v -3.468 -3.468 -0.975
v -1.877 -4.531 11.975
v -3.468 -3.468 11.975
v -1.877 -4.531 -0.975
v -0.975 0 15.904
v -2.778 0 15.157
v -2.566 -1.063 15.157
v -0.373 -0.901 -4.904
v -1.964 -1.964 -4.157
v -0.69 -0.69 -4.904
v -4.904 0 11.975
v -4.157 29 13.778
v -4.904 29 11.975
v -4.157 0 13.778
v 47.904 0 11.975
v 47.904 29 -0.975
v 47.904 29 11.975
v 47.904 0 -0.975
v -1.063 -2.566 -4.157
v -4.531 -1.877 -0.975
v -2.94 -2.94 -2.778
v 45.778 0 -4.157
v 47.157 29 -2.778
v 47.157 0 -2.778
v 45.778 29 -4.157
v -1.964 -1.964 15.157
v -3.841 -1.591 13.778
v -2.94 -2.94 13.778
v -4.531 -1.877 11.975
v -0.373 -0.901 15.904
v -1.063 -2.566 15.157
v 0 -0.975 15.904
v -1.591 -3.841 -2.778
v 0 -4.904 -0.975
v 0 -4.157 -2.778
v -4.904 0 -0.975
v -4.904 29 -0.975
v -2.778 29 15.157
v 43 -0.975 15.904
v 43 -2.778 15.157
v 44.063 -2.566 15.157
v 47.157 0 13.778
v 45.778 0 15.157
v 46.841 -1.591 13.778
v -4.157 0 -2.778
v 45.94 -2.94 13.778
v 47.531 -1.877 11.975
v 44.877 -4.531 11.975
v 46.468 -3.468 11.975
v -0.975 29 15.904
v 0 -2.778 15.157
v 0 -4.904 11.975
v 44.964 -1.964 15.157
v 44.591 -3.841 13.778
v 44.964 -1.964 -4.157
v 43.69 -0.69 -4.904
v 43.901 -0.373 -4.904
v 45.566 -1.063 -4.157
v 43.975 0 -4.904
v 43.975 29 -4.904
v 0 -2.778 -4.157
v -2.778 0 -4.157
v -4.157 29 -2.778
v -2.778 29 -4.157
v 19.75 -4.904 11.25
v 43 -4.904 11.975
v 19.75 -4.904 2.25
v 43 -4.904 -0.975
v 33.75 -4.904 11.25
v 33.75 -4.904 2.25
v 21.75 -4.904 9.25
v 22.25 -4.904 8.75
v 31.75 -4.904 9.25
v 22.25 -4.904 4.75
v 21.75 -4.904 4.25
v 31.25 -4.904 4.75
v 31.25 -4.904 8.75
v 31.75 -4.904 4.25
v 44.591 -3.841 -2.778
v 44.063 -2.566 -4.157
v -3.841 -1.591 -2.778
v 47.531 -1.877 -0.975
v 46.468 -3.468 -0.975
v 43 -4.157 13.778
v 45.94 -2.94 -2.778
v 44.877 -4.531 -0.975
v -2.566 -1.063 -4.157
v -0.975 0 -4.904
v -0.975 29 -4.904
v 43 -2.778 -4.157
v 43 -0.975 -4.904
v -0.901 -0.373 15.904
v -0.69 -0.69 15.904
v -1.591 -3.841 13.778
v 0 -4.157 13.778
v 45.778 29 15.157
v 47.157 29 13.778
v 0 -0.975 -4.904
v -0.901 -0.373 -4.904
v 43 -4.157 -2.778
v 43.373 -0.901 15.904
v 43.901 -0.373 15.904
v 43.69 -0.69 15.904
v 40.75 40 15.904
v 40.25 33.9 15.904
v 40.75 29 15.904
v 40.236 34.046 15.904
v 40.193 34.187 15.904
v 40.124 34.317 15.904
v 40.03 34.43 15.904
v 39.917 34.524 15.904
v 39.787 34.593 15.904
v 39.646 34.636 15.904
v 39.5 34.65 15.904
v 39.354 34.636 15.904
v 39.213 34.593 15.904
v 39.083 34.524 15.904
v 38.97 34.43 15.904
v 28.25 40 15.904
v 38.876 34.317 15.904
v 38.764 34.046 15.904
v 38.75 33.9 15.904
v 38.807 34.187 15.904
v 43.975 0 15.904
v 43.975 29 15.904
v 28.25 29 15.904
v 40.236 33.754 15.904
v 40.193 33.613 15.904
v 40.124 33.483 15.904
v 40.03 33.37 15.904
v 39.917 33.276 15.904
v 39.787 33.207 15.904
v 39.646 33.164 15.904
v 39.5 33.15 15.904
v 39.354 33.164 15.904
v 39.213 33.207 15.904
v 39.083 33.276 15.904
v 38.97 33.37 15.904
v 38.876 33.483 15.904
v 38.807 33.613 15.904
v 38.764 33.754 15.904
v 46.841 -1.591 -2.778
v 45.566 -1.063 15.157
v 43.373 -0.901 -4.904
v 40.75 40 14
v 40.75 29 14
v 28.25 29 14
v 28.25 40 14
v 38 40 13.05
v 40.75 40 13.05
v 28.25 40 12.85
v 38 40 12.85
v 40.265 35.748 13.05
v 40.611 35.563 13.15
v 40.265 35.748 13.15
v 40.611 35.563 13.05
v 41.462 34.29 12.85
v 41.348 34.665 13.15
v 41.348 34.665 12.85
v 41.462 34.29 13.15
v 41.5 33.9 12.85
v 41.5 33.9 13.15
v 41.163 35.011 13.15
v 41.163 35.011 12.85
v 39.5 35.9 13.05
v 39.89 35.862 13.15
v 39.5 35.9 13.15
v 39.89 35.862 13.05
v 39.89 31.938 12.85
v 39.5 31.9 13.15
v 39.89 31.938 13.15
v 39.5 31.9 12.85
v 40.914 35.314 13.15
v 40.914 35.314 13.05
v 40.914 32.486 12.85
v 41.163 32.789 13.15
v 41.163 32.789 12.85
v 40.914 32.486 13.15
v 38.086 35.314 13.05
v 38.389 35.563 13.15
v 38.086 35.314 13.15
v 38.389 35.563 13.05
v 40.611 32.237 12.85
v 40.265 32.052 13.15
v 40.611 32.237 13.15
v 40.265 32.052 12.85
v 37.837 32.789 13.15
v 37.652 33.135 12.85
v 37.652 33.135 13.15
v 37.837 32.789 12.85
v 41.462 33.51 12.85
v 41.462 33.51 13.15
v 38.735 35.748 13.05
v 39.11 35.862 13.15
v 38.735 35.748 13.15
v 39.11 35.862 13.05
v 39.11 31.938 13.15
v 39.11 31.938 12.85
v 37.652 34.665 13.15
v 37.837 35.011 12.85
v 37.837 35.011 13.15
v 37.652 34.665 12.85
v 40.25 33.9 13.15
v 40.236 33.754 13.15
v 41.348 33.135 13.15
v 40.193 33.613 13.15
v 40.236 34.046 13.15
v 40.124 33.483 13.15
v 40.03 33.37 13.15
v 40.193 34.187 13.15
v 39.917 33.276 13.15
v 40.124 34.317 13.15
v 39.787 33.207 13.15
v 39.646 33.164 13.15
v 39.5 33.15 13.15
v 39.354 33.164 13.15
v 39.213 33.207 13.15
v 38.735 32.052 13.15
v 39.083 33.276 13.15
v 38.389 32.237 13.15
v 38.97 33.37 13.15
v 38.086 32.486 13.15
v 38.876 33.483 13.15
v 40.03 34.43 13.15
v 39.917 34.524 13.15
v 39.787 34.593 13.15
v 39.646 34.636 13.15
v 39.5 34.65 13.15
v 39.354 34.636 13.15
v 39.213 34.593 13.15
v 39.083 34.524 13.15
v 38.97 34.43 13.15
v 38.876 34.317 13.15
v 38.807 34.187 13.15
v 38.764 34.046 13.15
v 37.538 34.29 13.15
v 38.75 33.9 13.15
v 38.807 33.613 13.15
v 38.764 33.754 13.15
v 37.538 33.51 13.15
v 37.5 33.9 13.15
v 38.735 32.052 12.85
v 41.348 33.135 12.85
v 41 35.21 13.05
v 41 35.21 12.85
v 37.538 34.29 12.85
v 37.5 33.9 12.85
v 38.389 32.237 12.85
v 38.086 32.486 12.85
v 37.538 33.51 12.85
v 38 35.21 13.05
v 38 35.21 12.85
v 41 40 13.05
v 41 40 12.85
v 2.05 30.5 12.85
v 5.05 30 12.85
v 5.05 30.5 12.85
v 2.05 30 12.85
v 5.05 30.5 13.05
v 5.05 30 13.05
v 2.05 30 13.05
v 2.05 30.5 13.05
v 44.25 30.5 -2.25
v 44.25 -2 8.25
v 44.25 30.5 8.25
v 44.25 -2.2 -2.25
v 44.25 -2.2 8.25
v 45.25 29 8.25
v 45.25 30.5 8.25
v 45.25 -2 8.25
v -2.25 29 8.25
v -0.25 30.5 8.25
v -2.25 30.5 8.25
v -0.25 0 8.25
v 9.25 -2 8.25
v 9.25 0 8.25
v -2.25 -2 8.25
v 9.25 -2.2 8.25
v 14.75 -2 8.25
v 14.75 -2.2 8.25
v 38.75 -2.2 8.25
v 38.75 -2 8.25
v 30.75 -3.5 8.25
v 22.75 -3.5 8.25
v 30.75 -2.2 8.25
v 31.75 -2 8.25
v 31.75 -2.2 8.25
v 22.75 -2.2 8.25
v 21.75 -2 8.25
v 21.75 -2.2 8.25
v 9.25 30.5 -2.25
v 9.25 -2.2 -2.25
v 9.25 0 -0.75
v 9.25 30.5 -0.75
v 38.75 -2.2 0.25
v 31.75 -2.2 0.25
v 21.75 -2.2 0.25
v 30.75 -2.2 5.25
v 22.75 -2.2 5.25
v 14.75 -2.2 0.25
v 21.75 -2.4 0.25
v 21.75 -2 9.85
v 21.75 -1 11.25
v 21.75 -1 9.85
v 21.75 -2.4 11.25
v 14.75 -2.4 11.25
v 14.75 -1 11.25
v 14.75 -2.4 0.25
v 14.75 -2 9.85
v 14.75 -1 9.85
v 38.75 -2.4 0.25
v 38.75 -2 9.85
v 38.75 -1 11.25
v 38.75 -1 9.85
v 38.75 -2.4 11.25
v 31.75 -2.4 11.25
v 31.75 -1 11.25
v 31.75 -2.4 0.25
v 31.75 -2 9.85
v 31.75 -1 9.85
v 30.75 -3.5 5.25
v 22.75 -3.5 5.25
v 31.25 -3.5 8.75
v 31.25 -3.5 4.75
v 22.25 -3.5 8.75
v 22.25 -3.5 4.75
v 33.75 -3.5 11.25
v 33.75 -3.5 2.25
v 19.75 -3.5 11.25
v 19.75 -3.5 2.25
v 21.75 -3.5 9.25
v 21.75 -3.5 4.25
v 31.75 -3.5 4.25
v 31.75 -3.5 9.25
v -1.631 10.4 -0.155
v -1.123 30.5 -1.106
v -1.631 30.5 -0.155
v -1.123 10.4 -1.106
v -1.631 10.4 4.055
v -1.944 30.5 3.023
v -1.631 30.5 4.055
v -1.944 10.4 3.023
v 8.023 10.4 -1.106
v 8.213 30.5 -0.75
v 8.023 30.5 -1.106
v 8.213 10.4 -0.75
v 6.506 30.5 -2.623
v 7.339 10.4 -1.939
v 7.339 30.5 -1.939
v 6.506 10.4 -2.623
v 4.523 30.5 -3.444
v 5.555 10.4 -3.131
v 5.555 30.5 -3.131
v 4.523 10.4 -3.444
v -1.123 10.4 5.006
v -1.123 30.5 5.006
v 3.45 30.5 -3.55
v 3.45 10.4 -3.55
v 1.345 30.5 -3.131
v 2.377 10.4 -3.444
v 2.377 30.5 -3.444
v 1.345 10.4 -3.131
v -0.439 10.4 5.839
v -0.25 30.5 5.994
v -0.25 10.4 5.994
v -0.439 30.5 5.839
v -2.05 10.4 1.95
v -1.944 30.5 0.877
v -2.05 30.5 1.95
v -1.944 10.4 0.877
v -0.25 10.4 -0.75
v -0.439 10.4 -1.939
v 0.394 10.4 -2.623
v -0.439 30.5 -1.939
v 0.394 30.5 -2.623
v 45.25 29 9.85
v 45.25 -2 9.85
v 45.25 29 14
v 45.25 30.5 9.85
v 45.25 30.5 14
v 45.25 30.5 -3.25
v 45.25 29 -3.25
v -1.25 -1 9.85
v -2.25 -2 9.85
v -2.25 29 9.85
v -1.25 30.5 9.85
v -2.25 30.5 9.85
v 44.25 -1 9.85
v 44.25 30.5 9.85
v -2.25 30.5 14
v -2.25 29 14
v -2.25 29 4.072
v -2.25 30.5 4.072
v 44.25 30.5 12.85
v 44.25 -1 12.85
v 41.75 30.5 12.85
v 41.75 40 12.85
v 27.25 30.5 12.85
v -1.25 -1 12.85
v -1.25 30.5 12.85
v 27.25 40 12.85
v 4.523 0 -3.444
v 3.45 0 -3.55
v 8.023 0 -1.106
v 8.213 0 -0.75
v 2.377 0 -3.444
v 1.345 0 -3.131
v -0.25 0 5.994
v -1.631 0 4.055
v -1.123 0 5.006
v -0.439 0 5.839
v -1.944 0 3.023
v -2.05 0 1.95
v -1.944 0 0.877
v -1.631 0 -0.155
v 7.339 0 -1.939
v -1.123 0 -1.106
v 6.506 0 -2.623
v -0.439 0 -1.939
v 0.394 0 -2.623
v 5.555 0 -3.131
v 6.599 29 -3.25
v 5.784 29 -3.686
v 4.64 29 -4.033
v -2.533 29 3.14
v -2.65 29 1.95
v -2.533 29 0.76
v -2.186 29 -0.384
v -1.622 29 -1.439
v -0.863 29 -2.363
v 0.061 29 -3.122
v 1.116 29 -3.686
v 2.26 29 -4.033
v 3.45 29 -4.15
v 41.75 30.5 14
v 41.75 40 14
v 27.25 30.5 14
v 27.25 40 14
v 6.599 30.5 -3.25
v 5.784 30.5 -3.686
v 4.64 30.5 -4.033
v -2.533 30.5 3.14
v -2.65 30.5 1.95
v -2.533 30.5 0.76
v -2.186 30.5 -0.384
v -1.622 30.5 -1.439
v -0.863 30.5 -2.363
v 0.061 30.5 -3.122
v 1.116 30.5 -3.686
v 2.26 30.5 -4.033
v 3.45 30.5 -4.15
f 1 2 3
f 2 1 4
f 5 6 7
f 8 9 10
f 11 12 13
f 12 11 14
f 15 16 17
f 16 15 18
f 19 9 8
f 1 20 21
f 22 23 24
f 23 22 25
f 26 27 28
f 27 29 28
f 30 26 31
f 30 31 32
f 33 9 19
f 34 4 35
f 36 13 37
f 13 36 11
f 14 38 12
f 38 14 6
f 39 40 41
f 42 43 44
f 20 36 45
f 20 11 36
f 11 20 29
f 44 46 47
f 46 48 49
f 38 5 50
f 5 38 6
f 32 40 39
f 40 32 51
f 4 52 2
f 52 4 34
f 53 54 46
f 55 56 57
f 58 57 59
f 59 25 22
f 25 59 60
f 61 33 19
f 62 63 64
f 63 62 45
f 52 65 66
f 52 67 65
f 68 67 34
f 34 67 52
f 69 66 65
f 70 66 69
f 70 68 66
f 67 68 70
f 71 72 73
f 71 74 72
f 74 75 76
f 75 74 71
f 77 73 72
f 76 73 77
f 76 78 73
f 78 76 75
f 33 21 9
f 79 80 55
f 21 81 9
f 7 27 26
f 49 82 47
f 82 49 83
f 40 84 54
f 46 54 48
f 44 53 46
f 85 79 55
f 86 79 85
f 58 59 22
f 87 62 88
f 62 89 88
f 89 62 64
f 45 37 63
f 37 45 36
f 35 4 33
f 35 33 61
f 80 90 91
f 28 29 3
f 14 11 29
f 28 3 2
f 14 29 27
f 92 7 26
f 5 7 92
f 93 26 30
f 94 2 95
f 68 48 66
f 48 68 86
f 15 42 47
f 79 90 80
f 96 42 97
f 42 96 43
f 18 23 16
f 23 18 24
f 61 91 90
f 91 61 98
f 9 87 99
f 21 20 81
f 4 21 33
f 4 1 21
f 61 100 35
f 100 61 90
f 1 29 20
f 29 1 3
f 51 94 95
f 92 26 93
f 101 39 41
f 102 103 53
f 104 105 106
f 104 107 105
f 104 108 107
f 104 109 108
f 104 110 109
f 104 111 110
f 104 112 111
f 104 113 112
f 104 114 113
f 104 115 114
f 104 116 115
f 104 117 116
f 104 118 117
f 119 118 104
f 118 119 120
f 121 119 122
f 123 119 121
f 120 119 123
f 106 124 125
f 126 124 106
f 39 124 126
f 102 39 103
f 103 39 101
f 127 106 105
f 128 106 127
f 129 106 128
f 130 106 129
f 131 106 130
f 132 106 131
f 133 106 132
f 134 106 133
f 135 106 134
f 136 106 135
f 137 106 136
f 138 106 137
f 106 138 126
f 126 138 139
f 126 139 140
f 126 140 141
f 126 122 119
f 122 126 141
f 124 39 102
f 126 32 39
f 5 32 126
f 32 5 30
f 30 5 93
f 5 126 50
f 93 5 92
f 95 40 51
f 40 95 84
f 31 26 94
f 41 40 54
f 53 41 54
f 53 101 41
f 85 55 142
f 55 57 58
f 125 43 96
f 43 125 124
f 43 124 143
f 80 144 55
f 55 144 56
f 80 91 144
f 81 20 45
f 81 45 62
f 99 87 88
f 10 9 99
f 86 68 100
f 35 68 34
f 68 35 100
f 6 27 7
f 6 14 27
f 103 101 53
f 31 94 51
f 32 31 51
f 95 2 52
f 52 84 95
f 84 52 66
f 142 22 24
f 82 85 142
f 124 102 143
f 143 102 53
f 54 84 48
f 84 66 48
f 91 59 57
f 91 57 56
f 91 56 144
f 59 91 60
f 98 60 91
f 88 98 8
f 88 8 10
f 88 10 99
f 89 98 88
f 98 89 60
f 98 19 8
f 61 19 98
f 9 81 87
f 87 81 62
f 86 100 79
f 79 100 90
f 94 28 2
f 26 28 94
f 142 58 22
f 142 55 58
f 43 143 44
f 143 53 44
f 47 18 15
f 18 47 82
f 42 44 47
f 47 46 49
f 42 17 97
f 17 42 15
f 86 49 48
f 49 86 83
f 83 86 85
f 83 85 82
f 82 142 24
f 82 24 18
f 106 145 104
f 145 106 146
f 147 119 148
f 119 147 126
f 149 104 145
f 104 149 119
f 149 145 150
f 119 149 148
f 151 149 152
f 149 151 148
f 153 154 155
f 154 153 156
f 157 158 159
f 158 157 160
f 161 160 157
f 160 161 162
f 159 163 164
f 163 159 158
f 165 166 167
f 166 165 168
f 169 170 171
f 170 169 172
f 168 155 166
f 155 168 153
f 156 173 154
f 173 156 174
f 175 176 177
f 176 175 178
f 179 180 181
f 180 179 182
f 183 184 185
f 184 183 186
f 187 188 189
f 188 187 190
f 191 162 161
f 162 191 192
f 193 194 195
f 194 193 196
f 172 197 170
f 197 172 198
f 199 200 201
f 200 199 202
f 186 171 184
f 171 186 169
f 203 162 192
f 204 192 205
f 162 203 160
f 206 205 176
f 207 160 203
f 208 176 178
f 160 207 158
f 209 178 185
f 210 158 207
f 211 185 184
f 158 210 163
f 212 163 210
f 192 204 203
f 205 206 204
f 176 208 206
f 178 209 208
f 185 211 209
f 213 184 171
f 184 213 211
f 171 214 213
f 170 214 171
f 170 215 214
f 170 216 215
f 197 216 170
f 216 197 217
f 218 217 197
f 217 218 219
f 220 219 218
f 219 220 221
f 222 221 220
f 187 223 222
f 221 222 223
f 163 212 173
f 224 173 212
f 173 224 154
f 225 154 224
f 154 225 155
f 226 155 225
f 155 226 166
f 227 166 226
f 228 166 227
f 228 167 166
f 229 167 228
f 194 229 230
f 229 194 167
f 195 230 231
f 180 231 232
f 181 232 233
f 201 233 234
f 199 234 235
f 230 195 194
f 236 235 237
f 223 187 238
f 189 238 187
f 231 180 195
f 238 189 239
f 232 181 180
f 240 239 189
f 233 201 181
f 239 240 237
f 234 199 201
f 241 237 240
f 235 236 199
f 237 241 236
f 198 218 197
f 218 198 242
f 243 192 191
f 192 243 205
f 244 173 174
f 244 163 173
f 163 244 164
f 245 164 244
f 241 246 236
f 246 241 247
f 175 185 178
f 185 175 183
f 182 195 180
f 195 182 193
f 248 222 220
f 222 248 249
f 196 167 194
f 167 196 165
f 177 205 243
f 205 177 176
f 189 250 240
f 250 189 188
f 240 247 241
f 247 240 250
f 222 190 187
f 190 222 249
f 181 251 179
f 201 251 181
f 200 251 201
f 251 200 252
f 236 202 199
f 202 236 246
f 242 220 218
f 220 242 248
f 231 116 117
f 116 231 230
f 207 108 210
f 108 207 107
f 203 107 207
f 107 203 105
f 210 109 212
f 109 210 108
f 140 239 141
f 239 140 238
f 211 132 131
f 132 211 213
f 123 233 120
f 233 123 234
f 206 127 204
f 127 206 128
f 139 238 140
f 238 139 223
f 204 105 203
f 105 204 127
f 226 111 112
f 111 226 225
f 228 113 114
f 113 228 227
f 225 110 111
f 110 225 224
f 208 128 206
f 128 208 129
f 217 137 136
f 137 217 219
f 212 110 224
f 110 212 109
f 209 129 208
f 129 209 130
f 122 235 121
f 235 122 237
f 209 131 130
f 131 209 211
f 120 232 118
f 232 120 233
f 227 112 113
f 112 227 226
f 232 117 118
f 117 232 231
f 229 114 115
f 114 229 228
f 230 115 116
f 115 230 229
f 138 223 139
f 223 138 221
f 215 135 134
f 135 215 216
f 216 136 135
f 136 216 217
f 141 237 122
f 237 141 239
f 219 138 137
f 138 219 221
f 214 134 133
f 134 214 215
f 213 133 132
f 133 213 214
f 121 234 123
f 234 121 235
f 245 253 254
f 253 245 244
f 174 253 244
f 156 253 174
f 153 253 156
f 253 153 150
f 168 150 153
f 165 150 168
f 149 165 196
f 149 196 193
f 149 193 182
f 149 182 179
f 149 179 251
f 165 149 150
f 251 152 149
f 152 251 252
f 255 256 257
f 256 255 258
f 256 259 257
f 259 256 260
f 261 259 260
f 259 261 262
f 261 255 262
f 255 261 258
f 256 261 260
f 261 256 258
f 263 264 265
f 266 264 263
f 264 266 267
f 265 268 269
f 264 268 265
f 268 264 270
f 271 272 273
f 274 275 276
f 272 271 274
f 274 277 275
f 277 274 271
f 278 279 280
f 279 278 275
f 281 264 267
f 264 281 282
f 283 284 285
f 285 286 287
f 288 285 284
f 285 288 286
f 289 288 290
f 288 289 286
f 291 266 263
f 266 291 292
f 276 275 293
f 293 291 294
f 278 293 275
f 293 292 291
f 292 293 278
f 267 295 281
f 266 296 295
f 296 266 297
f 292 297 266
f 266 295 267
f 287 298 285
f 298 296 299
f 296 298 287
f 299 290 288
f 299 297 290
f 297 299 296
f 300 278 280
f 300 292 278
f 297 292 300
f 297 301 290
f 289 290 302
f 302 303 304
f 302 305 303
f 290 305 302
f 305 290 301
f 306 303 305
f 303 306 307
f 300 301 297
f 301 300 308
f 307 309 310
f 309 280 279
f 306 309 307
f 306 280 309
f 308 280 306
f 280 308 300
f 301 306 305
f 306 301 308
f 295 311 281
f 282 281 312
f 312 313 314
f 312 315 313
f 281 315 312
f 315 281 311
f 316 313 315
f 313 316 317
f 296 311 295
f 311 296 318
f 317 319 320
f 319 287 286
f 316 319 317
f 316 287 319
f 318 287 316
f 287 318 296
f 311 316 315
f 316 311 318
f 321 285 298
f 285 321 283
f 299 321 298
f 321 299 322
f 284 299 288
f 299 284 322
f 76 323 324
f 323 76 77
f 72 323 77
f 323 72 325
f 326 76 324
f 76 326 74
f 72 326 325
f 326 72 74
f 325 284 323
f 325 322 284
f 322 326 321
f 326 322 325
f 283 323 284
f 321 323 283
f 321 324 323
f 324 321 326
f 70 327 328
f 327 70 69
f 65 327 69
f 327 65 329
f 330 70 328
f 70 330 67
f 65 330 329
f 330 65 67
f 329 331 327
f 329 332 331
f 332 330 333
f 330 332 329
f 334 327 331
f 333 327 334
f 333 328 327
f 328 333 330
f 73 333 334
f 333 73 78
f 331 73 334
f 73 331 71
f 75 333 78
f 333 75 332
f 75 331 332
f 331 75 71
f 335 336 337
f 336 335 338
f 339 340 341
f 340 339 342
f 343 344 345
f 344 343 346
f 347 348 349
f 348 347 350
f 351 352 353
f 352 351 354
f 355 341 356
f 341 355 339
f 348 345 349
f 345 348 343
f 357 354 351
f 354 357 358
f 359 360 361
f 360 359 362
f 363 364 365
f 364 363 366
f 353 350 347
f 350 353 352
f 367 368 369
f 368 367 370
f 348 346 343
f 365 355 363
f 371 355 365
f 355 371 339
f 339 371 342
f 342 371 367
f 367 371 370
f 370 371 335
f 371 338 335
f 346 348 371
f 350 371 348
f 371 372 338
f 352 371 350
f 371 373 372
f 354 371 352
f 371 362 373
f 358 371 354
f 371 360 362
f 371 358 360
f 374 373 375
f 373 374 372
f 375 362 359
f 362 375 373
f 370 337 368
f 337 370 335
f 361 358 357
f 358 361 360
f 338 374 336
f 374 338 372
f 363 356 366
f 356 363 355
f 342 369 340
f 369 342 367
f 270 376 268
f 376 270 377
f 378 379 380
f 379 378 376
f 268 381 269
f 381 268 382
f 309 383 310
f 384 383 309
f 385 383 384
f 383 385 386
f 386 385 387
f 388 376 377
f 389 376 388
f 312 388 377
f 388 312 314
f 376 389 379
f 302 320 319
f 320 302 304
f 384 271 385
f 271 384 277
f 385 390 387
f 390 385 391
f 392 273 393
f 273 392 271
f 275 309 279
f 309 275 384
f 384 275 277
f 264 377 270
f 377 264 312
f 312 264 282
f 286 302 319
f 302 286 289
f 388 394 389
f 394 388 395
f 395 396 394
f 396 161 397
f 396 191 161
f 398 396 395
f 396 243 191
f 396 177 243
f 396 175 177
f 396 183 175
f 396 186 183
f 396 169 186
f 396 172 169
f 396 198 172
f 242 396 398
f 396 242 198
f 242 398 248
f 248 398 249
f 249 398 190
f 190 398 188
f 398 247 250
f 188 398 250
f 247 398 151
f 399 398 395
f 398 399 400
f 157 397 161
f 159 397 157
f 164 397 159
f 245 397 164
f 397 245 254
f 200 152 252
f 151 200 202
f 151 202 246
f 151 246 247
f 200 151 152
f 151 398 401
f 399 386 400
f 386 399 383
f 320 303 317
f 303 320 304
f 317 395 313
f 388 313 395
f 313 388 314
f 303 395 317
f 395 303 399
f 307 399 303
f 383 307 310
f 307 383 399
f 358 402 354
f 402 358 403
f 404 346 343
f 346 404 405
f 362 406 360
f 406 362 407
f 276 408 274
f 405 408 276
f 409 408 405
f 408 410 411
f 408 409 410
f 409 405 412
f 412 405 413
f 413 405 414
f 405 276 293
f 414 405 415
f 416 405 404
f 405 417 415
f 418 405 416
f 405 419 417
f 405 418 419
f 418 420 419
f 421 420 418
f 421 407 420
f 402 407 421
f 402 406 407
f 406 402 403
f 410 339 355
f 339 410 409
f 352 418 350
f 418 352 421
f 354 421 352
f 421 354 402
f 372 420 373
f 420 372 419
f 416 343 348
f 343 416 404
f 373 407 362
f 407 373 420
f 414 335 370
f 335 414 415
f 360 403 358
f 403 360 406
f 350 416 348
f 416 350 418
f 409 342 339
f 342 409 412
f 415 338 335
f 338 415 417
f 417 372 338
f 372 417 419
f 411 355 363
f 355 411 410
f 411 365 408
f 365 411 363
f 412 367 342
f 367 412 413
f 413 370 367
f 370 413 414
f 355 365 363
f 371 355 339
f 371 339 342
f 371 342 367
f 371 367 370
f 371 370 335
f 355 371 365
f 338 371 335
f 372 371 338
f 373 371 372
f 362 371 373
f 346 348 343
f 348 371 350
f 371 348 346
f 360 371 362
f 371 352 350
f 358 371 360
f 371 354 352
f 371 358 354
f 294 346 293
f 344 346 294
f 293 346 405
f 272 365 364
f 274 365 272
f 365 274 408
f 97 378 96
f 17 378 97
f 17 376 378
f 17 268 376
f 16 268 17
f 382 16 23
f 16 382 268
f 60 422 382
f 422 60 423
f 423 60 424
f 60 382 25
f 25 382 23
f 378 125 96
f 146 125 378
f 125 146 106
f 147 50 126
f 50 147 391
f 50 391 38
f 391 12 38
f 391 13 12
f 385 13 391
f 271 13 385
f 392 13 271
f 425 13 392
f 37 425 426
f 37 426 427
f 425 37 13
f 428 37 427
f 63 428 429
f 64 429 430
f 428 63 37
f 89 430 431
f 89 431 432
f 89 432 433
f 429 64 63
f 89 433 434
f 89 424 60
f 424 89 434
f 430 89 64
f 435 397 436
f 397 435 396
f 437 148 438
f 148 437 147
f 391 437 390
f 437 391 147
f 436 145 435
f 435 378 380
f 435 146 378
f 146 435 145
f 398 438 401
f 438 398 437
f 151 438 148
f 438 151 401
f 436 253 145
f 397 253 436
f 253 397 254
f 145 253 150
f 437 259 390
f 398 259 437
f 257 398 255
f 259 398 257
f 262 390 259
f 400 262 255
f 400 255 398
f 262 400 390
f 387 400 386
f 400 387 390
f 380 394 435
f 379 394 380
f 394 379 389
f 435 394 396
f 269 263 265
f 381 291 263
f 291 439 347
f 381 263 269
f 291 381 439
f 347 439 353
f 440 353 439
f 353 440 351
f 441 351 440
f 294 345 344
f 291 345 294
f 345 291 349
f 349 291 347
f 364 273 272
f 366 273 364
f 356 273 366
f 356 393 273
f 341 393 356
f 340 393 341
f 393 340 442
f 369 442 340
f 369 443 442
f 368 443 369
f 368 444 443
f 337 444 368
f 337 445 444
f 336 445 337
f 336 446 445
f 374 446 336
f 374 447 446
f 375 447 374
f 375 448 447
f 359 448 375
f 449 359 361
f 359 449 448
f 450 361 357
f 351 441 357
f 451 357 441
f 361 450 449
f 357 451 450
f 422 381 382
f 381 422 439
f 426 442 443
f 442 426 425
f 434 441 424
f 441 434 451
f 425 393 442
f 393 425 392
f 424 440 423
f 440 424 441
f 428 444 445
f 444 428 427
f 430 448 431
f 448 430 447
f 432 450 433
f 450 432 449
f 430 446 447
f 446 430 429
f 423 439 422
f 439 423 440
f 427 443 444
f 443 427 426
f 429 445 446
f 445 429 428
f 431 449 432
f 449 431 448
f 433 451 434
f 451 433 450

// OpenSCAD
$fn=32;

module pcb()
{
	color("green")
		cube([47.5,67,1.6]);
	translate([1,1,1.5])					//components
		cube([45.5,65,3.1]);

	color("black")						//connecetor
		translate([36.75-6.25,44.3-2.3,1.6])
		{
			cube([12.5,4.6,4.4]);
			translate([0,0,4.3])
				#cube([12.5,4.6,5]);
		}

	
	translate([41.75,35.9,1.6])		//reset button
	{
		color("black")
			cylinder(r=2, h=3.3);
		#cylinder(r=0.75, h=10);
		translate([-1.5,0,2.9])
			#cube([3,7,0.3]);
	}
		

	color("black")
		translate([5.8,56,1.6])
			cylinder(r=1.5, h=3.1);
	translate([5.8,56,1.6+3])				//user button
	{
		//#cylinder(r=1.9, h=10);
		#cylinder(r=2.8, h=5);
		#cylinder(r=3.5, h=2);
		translate([0,0,3.5])
			#cylinder(r1=2.8, r2=4, h=2);
		translate([-1.5,-24,0])
			#cube([3,24,0.2]);

	}

	translate([5.55,62.7,1.6])			//led
	{
		#cylinder(r=2.1, h=7);
		#cylinder(r=3, h=1.5+3);
		translate([0,0,1.5+3+0.5])
			#cylinder(r1=2.1, r2=3.9, h=3.5);
	}

	color("silver")						//accu
	{
		translate([11.5,-.2,-10.5])
			cube([35,67.2,10.5]);
			
		translate([17,-0.4,-8])
			cube([7,4,11]);
		translate([34,-0.4,-8])
			cube([7,4,11]);
	}

	color("violet")						//usb connector
	{
		translate([29-4,-3.5, -3])
			cube([8,10,3]);
		translate([29-4.5,-4, -3-0.5])
				cube([9,2.5,4]);
	}
	translate([29-4-3,-1.5-5, -3-3])
		difference()
		{
			cube([8+6,5,3+6]);
			translate([2,0,2])
				cube([10,6,5]);
		}

	
	translate([5.7,2,-6.3])				//antenne
		rotate(-90,[1,0,0])
			#cylinder(r=5.5, h=10.4);
	color("black")
		translate([5.7,12.4,-6.3])
			rotate(-90,[1,0,0])
			{
				cylinder(r=5.5, h=54);
				translate([0,0,54])
				{
					cylinder(r1=5.5, r2=4, h=12);
					cylinder(r=2.5, h=30);
				}
			}
	translate([2,2,-9])
		#cube([20,64.99,9]);

}

module button()
{
		cylinder(r=2.8, h=4);
		cylinder(r=3.5, h=1.8);
}

module case()
{
	difference()
	{
		union()
		{
			minkowski()
			{
				sphere(r = 5, $fn=16);
				cube([43,63,11]);
			}
			translate([3.5,54,15.8])
				cylinder(r1=4.25, r2=3.4, h=1.2);
		}
		//translate([-6,-6,-6])
		//	cube([60,60,32]);
		//translate([30,-6,-6])
		//	cube([60,80,32]);
		translate([-2.25,-2,8.25])
			pcb();
	}
}

module upperCase()
{
	difference()
	{
		case();
		translate([-6,-6,-6])
			cube([60,35,32]);
		translate([28.25,28,12])
			cube([12.5,12,5]);
		translate([28.25-1,28,12])
			cube([14.5,12,2]);
		translate([-2.25,28,4])
			#cube([47.5,2.5,10]);
		translate([6,28,-3.25])
			cube([39.25,2.5,10]);
		translate([-2.25,-2,8.25])
			translate([5.7,12.4,-6.3])
				rotate(-90,[1,0,0])
					cylinder(r=6.1, h=20.1);

	}
}

module lowerCase()
{
	difference()	
	{
		case();
		upperCase();
	}

}

//pcb();
//case();

//upperCase();
lowerCase();
//button();
